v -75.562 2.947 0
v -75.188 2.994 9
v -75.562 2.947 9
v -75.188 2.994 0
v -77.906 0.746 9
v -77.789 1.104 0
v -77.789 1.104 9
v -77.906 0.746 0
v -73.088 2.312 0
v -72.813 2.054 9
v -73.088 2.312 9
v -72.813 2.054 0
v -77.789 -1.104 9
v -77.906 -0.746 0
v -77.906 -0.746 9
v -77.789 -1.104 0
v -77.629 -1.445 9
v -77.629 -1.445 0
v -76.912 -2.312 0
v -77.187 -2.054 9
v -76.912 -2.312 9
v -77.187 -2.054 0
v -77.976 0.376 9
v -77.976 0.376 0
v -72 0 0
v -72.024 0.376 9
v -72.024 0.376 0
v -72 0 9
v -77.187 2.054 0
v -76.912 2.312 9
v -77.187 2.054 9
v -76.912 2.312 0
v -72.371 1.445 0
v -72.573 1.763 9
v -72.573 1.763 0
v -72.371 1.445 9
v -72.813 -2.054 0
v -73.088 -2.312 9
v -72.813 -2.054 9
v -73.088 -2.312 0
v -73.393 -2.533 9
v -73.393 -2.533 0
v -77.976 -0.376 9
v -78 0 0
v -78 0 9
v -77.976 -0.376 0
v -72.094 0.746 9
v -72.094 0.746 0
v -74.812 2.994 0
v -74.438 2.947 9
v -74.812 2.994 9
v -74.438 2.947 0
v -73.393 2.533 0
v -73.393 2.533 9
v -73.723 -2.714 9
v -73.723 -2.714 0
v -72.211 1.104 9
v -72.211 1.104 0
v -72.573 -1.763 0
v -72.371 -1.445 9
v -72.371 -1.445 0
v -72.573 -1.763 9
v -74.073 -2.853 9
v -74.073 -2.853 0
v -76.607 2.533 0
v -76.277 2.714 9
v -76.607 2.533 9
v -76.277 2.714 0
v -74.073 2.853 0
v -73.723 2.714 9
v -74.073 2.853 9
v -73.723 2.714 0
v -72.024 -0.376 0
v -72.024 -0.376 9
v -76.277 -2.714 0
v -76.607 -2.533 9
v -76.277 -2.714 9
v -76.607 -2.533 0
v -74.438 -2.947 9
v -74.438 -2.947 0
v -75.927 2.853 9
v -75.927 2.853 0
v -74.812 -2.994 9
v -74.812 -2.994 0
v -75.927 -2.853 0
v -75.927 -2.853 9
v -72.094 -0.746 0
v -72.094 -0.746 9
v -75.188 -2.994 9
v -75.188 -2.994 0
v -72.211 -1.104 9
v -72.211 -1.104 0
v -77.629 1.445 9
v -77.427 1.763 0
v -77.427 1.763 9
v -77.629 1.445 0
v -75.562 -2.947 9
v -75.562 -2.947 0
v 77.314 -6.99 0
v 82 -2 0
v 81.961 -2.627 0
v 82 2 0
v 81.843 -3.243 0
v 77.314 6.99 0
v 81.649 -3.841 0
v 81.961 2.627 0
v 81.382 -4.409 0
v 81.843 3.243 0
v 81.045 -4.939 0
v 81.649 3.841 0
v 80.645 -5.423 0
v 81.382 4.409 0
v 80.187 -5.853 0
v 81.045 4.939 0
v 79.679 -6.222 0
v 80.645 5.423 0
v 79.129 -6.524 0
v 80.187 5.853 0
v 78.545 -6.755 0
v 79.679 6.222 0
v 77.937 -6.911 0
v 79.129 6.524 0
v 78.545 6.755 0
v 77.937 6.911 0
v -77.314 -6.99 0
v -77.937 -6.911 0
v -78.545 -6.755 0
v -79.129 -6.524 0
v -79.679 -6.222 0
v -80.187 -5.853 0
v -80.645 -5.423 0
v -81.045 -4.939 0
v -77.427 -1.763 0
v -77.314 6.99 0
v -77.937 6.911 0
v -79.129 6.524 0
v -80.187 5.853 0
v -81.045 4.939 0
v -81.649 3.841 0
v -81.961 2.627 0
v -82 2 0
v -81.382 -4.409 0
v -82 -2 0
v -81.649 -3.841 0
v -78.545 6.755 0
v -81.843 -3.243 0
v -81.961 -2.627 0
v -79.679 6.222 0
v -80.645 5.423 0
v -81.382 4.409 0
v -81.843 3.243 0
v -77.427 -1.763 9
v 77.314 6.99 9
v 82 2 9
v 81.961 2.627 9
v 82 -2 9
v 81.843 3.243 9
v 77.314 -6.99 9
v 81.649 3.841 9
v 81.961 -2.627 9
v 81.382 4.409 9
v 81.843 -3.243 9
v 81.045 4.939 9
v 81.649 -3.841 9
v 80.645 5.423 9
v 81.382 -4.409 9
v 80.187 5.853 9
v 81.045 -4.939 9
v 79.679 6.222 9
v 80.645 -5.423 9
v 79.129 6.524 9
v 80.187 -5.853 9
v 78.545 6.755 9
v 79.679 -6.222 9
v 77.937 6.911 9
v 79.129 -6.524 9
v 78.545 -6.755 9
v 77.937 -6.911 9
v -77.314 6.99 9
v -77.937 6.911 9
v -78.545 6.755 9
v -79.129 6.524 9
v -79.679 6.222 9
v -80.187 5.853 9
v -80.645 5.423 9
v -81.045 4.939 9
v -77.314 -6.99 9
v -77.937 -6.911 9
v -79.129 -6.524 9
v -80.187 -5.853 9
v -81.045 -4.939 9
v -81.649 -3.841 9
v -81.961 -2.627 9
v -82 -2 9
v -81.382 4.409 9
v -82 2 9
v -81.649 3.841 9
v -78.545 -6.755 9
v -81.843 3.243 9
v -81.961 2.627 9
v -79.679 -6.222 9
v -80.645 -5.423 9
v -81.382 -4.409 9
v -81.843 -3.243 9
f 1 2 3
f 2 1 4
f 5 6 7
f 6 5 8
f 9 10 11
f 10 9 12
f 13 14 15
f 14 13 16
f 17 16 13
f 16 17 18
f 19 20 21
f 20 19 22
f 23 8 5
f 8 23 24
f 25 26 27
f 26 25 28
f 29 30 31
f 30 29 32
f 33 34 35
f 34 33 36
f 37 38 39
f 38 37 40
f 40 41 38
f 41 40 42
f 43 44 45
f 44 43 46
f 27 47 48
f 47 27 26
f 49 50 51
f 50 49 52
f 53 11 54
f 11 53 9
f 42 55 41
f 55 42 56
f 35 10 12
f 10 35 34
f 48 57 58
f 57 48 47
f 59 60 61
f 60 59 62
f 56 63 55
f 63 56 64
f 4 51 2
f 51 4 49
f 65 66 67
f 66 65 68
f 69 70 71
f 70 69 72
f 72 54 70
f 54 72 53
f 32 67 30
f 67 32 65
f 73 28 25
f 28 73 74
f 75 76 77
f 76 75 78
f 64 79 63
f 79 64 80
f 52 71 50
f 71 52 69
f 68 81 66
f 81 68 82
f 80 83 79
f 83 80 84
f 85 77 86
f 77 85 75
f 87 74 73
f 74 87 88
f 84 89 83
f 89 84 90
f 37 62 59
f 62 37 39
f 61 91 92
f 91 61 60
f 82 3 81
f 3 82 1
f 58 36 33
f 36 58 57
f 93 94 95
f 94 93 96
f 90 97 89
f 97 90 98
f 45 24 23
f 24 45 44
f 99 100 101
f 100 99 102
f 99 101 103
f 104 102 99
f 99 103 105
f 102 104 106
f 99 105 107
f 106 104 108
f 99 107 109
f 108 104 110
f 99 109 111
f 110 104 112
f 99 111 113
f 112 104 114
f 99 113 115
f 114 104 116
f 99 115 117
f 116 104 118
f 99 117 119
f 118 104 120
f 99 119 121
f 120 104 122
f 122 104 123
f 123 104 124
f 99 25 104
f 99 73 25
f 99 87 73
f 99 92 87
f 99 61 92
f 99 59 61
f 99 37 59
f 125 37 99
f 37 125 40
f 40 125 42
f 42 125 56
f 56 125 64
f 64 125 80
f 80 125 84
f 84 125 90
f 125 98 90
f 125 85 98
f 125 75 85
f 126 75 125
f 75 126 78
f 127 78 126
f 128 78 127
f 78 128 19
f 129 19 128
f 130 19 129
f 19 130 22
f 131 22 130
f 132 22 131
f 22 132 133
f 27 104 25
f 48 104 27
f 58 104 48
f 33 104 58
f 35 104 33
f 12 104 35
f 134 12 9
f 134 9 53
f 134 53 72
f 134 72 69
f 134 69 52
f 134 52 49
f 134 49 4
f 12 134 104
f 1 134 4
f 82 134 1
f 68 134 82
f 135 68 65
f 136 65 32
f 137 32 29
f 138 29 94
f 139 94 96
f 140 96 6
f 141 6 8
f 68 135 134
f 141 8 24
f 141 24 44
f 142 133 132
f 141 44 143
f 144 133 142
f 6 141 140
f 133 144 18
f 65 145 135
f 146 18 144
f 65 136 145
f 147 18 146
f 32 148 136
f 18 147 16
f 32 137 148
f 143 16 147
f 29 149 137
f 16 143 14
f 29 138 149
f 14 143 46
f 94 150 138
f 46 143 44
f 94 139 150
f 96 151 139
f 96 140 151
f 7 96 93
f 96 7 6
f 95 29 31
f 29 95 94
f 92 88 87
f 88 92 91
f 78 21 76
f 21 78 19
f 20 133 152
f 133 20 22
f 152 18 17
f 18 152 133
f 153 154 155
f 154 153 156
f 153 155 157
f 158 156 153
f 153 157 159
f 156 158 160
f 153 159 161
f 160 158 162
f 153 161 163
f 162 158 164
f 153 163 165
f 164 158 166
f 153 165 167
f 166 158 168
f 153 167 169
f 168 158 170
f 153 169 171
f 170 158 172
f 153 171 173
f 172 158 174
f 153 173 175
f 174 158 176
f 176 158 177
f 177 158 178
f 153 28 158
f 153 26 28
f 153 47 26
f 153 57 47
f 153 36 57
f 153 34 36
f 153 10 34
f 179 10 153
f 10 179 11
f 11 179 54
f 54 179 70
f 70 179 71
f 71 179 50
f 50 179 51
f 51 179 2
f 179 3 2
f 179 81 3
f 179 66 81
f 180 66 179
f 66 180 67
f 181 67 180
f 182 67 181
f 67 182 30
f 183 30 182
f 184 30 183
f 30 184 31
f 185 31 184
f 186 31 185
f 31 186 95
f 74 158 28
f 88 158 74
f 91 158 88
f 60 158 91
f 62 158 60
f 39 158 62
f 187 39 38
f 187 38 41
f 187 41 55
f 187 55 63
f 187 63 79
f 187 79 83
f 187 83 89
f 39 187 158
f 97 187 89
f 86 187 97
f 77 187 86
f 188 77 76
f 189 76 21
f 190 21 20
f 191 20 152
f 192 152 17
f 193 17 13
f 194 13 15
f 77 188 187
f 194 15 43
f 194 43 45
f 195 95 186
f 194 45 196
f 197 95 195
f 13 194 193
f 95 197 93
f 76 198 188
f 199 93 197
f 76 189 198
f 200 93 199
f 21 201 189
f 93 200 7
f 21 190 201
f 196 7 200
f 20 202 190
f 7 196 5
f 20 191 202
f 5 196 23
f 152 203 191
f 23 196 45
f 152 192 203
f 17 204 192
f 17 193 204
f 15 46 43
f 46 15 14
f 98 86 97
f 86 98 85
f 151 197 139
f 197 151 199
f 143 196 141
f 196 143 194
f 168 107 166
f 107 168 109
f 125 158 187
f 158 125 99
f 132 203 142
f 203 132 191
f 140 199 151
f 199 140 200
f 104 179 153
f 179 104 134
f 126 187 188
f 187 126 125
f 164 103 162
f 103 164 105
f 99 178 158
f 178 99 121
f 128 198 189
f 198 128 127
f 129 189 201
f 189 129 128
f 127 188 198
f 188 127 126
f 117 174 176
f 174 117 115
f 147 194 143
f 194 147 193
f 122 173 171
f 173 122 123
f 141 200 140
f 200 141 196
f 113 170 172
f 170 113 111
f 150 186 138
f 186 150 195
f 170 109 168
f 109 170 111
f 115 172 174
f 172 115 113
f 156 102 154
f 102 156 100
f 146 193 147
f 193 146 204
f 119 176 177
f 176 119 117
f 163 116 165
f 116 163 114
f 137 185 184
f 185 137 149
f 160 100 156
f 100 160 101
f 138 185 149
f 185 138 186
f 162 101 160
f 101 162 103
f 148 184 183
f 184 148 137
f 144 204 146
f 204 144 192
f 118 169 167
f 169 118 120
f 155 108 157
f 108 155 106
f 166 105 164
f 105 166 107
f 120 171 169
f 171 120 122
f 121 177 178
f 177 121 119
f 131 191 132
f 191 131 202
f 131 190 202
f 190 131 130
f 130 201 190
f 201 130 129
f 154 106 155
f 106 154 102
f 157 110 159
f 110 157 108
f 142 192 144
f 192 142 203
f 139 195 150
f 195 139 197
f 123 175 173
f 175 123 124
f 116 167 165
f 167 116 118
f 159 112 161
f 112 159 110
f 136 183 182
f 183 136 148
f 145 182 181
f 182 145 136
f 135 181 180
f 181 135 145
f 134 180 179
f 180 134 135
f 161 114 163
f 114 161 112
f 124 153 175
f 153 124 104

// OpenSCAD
$fn = 50;


difference() {
	union() {
		hull() {
			translate(v = [-77.0000000000, 2.0000000000, 0]) {
				cylinder(h = 9, r = 5);
			}
			translate(v = [77.0000000000, 2.0000000000, 0]) {
				cylinder(h = 9, r = 5);
			}
			translate(v = [-77.0000000000, -2.0000000000, 0]) {
				cylinder(h = 9, r = 5);
			}
			translate(v = [77.0000000000, -2.0000000000, 0]) {
				cylinder(h = 9, r = 5);
			}
		}
	}
	union() {
		translate(v = [-75.0000000000, 0.0000000000, 0]) {
			cylinder(h = 9, r = 3.0000000000);
		}
		translate(v = [-75.0000000000, 0.0000000000, 0]) {
			cylinder(h = 9, r = 1.5000000000);
		}
		translate(v = [-75.0000000000, 0.0000000000, 0]) {
			cylinder(h = 9, r = 1.5000000000);
		}
		translate(v = [-75.0000000000, 0.0000000000, 0]) {
			cylinder(h = 9, r = 1.5000000000);
		}
	}
}
